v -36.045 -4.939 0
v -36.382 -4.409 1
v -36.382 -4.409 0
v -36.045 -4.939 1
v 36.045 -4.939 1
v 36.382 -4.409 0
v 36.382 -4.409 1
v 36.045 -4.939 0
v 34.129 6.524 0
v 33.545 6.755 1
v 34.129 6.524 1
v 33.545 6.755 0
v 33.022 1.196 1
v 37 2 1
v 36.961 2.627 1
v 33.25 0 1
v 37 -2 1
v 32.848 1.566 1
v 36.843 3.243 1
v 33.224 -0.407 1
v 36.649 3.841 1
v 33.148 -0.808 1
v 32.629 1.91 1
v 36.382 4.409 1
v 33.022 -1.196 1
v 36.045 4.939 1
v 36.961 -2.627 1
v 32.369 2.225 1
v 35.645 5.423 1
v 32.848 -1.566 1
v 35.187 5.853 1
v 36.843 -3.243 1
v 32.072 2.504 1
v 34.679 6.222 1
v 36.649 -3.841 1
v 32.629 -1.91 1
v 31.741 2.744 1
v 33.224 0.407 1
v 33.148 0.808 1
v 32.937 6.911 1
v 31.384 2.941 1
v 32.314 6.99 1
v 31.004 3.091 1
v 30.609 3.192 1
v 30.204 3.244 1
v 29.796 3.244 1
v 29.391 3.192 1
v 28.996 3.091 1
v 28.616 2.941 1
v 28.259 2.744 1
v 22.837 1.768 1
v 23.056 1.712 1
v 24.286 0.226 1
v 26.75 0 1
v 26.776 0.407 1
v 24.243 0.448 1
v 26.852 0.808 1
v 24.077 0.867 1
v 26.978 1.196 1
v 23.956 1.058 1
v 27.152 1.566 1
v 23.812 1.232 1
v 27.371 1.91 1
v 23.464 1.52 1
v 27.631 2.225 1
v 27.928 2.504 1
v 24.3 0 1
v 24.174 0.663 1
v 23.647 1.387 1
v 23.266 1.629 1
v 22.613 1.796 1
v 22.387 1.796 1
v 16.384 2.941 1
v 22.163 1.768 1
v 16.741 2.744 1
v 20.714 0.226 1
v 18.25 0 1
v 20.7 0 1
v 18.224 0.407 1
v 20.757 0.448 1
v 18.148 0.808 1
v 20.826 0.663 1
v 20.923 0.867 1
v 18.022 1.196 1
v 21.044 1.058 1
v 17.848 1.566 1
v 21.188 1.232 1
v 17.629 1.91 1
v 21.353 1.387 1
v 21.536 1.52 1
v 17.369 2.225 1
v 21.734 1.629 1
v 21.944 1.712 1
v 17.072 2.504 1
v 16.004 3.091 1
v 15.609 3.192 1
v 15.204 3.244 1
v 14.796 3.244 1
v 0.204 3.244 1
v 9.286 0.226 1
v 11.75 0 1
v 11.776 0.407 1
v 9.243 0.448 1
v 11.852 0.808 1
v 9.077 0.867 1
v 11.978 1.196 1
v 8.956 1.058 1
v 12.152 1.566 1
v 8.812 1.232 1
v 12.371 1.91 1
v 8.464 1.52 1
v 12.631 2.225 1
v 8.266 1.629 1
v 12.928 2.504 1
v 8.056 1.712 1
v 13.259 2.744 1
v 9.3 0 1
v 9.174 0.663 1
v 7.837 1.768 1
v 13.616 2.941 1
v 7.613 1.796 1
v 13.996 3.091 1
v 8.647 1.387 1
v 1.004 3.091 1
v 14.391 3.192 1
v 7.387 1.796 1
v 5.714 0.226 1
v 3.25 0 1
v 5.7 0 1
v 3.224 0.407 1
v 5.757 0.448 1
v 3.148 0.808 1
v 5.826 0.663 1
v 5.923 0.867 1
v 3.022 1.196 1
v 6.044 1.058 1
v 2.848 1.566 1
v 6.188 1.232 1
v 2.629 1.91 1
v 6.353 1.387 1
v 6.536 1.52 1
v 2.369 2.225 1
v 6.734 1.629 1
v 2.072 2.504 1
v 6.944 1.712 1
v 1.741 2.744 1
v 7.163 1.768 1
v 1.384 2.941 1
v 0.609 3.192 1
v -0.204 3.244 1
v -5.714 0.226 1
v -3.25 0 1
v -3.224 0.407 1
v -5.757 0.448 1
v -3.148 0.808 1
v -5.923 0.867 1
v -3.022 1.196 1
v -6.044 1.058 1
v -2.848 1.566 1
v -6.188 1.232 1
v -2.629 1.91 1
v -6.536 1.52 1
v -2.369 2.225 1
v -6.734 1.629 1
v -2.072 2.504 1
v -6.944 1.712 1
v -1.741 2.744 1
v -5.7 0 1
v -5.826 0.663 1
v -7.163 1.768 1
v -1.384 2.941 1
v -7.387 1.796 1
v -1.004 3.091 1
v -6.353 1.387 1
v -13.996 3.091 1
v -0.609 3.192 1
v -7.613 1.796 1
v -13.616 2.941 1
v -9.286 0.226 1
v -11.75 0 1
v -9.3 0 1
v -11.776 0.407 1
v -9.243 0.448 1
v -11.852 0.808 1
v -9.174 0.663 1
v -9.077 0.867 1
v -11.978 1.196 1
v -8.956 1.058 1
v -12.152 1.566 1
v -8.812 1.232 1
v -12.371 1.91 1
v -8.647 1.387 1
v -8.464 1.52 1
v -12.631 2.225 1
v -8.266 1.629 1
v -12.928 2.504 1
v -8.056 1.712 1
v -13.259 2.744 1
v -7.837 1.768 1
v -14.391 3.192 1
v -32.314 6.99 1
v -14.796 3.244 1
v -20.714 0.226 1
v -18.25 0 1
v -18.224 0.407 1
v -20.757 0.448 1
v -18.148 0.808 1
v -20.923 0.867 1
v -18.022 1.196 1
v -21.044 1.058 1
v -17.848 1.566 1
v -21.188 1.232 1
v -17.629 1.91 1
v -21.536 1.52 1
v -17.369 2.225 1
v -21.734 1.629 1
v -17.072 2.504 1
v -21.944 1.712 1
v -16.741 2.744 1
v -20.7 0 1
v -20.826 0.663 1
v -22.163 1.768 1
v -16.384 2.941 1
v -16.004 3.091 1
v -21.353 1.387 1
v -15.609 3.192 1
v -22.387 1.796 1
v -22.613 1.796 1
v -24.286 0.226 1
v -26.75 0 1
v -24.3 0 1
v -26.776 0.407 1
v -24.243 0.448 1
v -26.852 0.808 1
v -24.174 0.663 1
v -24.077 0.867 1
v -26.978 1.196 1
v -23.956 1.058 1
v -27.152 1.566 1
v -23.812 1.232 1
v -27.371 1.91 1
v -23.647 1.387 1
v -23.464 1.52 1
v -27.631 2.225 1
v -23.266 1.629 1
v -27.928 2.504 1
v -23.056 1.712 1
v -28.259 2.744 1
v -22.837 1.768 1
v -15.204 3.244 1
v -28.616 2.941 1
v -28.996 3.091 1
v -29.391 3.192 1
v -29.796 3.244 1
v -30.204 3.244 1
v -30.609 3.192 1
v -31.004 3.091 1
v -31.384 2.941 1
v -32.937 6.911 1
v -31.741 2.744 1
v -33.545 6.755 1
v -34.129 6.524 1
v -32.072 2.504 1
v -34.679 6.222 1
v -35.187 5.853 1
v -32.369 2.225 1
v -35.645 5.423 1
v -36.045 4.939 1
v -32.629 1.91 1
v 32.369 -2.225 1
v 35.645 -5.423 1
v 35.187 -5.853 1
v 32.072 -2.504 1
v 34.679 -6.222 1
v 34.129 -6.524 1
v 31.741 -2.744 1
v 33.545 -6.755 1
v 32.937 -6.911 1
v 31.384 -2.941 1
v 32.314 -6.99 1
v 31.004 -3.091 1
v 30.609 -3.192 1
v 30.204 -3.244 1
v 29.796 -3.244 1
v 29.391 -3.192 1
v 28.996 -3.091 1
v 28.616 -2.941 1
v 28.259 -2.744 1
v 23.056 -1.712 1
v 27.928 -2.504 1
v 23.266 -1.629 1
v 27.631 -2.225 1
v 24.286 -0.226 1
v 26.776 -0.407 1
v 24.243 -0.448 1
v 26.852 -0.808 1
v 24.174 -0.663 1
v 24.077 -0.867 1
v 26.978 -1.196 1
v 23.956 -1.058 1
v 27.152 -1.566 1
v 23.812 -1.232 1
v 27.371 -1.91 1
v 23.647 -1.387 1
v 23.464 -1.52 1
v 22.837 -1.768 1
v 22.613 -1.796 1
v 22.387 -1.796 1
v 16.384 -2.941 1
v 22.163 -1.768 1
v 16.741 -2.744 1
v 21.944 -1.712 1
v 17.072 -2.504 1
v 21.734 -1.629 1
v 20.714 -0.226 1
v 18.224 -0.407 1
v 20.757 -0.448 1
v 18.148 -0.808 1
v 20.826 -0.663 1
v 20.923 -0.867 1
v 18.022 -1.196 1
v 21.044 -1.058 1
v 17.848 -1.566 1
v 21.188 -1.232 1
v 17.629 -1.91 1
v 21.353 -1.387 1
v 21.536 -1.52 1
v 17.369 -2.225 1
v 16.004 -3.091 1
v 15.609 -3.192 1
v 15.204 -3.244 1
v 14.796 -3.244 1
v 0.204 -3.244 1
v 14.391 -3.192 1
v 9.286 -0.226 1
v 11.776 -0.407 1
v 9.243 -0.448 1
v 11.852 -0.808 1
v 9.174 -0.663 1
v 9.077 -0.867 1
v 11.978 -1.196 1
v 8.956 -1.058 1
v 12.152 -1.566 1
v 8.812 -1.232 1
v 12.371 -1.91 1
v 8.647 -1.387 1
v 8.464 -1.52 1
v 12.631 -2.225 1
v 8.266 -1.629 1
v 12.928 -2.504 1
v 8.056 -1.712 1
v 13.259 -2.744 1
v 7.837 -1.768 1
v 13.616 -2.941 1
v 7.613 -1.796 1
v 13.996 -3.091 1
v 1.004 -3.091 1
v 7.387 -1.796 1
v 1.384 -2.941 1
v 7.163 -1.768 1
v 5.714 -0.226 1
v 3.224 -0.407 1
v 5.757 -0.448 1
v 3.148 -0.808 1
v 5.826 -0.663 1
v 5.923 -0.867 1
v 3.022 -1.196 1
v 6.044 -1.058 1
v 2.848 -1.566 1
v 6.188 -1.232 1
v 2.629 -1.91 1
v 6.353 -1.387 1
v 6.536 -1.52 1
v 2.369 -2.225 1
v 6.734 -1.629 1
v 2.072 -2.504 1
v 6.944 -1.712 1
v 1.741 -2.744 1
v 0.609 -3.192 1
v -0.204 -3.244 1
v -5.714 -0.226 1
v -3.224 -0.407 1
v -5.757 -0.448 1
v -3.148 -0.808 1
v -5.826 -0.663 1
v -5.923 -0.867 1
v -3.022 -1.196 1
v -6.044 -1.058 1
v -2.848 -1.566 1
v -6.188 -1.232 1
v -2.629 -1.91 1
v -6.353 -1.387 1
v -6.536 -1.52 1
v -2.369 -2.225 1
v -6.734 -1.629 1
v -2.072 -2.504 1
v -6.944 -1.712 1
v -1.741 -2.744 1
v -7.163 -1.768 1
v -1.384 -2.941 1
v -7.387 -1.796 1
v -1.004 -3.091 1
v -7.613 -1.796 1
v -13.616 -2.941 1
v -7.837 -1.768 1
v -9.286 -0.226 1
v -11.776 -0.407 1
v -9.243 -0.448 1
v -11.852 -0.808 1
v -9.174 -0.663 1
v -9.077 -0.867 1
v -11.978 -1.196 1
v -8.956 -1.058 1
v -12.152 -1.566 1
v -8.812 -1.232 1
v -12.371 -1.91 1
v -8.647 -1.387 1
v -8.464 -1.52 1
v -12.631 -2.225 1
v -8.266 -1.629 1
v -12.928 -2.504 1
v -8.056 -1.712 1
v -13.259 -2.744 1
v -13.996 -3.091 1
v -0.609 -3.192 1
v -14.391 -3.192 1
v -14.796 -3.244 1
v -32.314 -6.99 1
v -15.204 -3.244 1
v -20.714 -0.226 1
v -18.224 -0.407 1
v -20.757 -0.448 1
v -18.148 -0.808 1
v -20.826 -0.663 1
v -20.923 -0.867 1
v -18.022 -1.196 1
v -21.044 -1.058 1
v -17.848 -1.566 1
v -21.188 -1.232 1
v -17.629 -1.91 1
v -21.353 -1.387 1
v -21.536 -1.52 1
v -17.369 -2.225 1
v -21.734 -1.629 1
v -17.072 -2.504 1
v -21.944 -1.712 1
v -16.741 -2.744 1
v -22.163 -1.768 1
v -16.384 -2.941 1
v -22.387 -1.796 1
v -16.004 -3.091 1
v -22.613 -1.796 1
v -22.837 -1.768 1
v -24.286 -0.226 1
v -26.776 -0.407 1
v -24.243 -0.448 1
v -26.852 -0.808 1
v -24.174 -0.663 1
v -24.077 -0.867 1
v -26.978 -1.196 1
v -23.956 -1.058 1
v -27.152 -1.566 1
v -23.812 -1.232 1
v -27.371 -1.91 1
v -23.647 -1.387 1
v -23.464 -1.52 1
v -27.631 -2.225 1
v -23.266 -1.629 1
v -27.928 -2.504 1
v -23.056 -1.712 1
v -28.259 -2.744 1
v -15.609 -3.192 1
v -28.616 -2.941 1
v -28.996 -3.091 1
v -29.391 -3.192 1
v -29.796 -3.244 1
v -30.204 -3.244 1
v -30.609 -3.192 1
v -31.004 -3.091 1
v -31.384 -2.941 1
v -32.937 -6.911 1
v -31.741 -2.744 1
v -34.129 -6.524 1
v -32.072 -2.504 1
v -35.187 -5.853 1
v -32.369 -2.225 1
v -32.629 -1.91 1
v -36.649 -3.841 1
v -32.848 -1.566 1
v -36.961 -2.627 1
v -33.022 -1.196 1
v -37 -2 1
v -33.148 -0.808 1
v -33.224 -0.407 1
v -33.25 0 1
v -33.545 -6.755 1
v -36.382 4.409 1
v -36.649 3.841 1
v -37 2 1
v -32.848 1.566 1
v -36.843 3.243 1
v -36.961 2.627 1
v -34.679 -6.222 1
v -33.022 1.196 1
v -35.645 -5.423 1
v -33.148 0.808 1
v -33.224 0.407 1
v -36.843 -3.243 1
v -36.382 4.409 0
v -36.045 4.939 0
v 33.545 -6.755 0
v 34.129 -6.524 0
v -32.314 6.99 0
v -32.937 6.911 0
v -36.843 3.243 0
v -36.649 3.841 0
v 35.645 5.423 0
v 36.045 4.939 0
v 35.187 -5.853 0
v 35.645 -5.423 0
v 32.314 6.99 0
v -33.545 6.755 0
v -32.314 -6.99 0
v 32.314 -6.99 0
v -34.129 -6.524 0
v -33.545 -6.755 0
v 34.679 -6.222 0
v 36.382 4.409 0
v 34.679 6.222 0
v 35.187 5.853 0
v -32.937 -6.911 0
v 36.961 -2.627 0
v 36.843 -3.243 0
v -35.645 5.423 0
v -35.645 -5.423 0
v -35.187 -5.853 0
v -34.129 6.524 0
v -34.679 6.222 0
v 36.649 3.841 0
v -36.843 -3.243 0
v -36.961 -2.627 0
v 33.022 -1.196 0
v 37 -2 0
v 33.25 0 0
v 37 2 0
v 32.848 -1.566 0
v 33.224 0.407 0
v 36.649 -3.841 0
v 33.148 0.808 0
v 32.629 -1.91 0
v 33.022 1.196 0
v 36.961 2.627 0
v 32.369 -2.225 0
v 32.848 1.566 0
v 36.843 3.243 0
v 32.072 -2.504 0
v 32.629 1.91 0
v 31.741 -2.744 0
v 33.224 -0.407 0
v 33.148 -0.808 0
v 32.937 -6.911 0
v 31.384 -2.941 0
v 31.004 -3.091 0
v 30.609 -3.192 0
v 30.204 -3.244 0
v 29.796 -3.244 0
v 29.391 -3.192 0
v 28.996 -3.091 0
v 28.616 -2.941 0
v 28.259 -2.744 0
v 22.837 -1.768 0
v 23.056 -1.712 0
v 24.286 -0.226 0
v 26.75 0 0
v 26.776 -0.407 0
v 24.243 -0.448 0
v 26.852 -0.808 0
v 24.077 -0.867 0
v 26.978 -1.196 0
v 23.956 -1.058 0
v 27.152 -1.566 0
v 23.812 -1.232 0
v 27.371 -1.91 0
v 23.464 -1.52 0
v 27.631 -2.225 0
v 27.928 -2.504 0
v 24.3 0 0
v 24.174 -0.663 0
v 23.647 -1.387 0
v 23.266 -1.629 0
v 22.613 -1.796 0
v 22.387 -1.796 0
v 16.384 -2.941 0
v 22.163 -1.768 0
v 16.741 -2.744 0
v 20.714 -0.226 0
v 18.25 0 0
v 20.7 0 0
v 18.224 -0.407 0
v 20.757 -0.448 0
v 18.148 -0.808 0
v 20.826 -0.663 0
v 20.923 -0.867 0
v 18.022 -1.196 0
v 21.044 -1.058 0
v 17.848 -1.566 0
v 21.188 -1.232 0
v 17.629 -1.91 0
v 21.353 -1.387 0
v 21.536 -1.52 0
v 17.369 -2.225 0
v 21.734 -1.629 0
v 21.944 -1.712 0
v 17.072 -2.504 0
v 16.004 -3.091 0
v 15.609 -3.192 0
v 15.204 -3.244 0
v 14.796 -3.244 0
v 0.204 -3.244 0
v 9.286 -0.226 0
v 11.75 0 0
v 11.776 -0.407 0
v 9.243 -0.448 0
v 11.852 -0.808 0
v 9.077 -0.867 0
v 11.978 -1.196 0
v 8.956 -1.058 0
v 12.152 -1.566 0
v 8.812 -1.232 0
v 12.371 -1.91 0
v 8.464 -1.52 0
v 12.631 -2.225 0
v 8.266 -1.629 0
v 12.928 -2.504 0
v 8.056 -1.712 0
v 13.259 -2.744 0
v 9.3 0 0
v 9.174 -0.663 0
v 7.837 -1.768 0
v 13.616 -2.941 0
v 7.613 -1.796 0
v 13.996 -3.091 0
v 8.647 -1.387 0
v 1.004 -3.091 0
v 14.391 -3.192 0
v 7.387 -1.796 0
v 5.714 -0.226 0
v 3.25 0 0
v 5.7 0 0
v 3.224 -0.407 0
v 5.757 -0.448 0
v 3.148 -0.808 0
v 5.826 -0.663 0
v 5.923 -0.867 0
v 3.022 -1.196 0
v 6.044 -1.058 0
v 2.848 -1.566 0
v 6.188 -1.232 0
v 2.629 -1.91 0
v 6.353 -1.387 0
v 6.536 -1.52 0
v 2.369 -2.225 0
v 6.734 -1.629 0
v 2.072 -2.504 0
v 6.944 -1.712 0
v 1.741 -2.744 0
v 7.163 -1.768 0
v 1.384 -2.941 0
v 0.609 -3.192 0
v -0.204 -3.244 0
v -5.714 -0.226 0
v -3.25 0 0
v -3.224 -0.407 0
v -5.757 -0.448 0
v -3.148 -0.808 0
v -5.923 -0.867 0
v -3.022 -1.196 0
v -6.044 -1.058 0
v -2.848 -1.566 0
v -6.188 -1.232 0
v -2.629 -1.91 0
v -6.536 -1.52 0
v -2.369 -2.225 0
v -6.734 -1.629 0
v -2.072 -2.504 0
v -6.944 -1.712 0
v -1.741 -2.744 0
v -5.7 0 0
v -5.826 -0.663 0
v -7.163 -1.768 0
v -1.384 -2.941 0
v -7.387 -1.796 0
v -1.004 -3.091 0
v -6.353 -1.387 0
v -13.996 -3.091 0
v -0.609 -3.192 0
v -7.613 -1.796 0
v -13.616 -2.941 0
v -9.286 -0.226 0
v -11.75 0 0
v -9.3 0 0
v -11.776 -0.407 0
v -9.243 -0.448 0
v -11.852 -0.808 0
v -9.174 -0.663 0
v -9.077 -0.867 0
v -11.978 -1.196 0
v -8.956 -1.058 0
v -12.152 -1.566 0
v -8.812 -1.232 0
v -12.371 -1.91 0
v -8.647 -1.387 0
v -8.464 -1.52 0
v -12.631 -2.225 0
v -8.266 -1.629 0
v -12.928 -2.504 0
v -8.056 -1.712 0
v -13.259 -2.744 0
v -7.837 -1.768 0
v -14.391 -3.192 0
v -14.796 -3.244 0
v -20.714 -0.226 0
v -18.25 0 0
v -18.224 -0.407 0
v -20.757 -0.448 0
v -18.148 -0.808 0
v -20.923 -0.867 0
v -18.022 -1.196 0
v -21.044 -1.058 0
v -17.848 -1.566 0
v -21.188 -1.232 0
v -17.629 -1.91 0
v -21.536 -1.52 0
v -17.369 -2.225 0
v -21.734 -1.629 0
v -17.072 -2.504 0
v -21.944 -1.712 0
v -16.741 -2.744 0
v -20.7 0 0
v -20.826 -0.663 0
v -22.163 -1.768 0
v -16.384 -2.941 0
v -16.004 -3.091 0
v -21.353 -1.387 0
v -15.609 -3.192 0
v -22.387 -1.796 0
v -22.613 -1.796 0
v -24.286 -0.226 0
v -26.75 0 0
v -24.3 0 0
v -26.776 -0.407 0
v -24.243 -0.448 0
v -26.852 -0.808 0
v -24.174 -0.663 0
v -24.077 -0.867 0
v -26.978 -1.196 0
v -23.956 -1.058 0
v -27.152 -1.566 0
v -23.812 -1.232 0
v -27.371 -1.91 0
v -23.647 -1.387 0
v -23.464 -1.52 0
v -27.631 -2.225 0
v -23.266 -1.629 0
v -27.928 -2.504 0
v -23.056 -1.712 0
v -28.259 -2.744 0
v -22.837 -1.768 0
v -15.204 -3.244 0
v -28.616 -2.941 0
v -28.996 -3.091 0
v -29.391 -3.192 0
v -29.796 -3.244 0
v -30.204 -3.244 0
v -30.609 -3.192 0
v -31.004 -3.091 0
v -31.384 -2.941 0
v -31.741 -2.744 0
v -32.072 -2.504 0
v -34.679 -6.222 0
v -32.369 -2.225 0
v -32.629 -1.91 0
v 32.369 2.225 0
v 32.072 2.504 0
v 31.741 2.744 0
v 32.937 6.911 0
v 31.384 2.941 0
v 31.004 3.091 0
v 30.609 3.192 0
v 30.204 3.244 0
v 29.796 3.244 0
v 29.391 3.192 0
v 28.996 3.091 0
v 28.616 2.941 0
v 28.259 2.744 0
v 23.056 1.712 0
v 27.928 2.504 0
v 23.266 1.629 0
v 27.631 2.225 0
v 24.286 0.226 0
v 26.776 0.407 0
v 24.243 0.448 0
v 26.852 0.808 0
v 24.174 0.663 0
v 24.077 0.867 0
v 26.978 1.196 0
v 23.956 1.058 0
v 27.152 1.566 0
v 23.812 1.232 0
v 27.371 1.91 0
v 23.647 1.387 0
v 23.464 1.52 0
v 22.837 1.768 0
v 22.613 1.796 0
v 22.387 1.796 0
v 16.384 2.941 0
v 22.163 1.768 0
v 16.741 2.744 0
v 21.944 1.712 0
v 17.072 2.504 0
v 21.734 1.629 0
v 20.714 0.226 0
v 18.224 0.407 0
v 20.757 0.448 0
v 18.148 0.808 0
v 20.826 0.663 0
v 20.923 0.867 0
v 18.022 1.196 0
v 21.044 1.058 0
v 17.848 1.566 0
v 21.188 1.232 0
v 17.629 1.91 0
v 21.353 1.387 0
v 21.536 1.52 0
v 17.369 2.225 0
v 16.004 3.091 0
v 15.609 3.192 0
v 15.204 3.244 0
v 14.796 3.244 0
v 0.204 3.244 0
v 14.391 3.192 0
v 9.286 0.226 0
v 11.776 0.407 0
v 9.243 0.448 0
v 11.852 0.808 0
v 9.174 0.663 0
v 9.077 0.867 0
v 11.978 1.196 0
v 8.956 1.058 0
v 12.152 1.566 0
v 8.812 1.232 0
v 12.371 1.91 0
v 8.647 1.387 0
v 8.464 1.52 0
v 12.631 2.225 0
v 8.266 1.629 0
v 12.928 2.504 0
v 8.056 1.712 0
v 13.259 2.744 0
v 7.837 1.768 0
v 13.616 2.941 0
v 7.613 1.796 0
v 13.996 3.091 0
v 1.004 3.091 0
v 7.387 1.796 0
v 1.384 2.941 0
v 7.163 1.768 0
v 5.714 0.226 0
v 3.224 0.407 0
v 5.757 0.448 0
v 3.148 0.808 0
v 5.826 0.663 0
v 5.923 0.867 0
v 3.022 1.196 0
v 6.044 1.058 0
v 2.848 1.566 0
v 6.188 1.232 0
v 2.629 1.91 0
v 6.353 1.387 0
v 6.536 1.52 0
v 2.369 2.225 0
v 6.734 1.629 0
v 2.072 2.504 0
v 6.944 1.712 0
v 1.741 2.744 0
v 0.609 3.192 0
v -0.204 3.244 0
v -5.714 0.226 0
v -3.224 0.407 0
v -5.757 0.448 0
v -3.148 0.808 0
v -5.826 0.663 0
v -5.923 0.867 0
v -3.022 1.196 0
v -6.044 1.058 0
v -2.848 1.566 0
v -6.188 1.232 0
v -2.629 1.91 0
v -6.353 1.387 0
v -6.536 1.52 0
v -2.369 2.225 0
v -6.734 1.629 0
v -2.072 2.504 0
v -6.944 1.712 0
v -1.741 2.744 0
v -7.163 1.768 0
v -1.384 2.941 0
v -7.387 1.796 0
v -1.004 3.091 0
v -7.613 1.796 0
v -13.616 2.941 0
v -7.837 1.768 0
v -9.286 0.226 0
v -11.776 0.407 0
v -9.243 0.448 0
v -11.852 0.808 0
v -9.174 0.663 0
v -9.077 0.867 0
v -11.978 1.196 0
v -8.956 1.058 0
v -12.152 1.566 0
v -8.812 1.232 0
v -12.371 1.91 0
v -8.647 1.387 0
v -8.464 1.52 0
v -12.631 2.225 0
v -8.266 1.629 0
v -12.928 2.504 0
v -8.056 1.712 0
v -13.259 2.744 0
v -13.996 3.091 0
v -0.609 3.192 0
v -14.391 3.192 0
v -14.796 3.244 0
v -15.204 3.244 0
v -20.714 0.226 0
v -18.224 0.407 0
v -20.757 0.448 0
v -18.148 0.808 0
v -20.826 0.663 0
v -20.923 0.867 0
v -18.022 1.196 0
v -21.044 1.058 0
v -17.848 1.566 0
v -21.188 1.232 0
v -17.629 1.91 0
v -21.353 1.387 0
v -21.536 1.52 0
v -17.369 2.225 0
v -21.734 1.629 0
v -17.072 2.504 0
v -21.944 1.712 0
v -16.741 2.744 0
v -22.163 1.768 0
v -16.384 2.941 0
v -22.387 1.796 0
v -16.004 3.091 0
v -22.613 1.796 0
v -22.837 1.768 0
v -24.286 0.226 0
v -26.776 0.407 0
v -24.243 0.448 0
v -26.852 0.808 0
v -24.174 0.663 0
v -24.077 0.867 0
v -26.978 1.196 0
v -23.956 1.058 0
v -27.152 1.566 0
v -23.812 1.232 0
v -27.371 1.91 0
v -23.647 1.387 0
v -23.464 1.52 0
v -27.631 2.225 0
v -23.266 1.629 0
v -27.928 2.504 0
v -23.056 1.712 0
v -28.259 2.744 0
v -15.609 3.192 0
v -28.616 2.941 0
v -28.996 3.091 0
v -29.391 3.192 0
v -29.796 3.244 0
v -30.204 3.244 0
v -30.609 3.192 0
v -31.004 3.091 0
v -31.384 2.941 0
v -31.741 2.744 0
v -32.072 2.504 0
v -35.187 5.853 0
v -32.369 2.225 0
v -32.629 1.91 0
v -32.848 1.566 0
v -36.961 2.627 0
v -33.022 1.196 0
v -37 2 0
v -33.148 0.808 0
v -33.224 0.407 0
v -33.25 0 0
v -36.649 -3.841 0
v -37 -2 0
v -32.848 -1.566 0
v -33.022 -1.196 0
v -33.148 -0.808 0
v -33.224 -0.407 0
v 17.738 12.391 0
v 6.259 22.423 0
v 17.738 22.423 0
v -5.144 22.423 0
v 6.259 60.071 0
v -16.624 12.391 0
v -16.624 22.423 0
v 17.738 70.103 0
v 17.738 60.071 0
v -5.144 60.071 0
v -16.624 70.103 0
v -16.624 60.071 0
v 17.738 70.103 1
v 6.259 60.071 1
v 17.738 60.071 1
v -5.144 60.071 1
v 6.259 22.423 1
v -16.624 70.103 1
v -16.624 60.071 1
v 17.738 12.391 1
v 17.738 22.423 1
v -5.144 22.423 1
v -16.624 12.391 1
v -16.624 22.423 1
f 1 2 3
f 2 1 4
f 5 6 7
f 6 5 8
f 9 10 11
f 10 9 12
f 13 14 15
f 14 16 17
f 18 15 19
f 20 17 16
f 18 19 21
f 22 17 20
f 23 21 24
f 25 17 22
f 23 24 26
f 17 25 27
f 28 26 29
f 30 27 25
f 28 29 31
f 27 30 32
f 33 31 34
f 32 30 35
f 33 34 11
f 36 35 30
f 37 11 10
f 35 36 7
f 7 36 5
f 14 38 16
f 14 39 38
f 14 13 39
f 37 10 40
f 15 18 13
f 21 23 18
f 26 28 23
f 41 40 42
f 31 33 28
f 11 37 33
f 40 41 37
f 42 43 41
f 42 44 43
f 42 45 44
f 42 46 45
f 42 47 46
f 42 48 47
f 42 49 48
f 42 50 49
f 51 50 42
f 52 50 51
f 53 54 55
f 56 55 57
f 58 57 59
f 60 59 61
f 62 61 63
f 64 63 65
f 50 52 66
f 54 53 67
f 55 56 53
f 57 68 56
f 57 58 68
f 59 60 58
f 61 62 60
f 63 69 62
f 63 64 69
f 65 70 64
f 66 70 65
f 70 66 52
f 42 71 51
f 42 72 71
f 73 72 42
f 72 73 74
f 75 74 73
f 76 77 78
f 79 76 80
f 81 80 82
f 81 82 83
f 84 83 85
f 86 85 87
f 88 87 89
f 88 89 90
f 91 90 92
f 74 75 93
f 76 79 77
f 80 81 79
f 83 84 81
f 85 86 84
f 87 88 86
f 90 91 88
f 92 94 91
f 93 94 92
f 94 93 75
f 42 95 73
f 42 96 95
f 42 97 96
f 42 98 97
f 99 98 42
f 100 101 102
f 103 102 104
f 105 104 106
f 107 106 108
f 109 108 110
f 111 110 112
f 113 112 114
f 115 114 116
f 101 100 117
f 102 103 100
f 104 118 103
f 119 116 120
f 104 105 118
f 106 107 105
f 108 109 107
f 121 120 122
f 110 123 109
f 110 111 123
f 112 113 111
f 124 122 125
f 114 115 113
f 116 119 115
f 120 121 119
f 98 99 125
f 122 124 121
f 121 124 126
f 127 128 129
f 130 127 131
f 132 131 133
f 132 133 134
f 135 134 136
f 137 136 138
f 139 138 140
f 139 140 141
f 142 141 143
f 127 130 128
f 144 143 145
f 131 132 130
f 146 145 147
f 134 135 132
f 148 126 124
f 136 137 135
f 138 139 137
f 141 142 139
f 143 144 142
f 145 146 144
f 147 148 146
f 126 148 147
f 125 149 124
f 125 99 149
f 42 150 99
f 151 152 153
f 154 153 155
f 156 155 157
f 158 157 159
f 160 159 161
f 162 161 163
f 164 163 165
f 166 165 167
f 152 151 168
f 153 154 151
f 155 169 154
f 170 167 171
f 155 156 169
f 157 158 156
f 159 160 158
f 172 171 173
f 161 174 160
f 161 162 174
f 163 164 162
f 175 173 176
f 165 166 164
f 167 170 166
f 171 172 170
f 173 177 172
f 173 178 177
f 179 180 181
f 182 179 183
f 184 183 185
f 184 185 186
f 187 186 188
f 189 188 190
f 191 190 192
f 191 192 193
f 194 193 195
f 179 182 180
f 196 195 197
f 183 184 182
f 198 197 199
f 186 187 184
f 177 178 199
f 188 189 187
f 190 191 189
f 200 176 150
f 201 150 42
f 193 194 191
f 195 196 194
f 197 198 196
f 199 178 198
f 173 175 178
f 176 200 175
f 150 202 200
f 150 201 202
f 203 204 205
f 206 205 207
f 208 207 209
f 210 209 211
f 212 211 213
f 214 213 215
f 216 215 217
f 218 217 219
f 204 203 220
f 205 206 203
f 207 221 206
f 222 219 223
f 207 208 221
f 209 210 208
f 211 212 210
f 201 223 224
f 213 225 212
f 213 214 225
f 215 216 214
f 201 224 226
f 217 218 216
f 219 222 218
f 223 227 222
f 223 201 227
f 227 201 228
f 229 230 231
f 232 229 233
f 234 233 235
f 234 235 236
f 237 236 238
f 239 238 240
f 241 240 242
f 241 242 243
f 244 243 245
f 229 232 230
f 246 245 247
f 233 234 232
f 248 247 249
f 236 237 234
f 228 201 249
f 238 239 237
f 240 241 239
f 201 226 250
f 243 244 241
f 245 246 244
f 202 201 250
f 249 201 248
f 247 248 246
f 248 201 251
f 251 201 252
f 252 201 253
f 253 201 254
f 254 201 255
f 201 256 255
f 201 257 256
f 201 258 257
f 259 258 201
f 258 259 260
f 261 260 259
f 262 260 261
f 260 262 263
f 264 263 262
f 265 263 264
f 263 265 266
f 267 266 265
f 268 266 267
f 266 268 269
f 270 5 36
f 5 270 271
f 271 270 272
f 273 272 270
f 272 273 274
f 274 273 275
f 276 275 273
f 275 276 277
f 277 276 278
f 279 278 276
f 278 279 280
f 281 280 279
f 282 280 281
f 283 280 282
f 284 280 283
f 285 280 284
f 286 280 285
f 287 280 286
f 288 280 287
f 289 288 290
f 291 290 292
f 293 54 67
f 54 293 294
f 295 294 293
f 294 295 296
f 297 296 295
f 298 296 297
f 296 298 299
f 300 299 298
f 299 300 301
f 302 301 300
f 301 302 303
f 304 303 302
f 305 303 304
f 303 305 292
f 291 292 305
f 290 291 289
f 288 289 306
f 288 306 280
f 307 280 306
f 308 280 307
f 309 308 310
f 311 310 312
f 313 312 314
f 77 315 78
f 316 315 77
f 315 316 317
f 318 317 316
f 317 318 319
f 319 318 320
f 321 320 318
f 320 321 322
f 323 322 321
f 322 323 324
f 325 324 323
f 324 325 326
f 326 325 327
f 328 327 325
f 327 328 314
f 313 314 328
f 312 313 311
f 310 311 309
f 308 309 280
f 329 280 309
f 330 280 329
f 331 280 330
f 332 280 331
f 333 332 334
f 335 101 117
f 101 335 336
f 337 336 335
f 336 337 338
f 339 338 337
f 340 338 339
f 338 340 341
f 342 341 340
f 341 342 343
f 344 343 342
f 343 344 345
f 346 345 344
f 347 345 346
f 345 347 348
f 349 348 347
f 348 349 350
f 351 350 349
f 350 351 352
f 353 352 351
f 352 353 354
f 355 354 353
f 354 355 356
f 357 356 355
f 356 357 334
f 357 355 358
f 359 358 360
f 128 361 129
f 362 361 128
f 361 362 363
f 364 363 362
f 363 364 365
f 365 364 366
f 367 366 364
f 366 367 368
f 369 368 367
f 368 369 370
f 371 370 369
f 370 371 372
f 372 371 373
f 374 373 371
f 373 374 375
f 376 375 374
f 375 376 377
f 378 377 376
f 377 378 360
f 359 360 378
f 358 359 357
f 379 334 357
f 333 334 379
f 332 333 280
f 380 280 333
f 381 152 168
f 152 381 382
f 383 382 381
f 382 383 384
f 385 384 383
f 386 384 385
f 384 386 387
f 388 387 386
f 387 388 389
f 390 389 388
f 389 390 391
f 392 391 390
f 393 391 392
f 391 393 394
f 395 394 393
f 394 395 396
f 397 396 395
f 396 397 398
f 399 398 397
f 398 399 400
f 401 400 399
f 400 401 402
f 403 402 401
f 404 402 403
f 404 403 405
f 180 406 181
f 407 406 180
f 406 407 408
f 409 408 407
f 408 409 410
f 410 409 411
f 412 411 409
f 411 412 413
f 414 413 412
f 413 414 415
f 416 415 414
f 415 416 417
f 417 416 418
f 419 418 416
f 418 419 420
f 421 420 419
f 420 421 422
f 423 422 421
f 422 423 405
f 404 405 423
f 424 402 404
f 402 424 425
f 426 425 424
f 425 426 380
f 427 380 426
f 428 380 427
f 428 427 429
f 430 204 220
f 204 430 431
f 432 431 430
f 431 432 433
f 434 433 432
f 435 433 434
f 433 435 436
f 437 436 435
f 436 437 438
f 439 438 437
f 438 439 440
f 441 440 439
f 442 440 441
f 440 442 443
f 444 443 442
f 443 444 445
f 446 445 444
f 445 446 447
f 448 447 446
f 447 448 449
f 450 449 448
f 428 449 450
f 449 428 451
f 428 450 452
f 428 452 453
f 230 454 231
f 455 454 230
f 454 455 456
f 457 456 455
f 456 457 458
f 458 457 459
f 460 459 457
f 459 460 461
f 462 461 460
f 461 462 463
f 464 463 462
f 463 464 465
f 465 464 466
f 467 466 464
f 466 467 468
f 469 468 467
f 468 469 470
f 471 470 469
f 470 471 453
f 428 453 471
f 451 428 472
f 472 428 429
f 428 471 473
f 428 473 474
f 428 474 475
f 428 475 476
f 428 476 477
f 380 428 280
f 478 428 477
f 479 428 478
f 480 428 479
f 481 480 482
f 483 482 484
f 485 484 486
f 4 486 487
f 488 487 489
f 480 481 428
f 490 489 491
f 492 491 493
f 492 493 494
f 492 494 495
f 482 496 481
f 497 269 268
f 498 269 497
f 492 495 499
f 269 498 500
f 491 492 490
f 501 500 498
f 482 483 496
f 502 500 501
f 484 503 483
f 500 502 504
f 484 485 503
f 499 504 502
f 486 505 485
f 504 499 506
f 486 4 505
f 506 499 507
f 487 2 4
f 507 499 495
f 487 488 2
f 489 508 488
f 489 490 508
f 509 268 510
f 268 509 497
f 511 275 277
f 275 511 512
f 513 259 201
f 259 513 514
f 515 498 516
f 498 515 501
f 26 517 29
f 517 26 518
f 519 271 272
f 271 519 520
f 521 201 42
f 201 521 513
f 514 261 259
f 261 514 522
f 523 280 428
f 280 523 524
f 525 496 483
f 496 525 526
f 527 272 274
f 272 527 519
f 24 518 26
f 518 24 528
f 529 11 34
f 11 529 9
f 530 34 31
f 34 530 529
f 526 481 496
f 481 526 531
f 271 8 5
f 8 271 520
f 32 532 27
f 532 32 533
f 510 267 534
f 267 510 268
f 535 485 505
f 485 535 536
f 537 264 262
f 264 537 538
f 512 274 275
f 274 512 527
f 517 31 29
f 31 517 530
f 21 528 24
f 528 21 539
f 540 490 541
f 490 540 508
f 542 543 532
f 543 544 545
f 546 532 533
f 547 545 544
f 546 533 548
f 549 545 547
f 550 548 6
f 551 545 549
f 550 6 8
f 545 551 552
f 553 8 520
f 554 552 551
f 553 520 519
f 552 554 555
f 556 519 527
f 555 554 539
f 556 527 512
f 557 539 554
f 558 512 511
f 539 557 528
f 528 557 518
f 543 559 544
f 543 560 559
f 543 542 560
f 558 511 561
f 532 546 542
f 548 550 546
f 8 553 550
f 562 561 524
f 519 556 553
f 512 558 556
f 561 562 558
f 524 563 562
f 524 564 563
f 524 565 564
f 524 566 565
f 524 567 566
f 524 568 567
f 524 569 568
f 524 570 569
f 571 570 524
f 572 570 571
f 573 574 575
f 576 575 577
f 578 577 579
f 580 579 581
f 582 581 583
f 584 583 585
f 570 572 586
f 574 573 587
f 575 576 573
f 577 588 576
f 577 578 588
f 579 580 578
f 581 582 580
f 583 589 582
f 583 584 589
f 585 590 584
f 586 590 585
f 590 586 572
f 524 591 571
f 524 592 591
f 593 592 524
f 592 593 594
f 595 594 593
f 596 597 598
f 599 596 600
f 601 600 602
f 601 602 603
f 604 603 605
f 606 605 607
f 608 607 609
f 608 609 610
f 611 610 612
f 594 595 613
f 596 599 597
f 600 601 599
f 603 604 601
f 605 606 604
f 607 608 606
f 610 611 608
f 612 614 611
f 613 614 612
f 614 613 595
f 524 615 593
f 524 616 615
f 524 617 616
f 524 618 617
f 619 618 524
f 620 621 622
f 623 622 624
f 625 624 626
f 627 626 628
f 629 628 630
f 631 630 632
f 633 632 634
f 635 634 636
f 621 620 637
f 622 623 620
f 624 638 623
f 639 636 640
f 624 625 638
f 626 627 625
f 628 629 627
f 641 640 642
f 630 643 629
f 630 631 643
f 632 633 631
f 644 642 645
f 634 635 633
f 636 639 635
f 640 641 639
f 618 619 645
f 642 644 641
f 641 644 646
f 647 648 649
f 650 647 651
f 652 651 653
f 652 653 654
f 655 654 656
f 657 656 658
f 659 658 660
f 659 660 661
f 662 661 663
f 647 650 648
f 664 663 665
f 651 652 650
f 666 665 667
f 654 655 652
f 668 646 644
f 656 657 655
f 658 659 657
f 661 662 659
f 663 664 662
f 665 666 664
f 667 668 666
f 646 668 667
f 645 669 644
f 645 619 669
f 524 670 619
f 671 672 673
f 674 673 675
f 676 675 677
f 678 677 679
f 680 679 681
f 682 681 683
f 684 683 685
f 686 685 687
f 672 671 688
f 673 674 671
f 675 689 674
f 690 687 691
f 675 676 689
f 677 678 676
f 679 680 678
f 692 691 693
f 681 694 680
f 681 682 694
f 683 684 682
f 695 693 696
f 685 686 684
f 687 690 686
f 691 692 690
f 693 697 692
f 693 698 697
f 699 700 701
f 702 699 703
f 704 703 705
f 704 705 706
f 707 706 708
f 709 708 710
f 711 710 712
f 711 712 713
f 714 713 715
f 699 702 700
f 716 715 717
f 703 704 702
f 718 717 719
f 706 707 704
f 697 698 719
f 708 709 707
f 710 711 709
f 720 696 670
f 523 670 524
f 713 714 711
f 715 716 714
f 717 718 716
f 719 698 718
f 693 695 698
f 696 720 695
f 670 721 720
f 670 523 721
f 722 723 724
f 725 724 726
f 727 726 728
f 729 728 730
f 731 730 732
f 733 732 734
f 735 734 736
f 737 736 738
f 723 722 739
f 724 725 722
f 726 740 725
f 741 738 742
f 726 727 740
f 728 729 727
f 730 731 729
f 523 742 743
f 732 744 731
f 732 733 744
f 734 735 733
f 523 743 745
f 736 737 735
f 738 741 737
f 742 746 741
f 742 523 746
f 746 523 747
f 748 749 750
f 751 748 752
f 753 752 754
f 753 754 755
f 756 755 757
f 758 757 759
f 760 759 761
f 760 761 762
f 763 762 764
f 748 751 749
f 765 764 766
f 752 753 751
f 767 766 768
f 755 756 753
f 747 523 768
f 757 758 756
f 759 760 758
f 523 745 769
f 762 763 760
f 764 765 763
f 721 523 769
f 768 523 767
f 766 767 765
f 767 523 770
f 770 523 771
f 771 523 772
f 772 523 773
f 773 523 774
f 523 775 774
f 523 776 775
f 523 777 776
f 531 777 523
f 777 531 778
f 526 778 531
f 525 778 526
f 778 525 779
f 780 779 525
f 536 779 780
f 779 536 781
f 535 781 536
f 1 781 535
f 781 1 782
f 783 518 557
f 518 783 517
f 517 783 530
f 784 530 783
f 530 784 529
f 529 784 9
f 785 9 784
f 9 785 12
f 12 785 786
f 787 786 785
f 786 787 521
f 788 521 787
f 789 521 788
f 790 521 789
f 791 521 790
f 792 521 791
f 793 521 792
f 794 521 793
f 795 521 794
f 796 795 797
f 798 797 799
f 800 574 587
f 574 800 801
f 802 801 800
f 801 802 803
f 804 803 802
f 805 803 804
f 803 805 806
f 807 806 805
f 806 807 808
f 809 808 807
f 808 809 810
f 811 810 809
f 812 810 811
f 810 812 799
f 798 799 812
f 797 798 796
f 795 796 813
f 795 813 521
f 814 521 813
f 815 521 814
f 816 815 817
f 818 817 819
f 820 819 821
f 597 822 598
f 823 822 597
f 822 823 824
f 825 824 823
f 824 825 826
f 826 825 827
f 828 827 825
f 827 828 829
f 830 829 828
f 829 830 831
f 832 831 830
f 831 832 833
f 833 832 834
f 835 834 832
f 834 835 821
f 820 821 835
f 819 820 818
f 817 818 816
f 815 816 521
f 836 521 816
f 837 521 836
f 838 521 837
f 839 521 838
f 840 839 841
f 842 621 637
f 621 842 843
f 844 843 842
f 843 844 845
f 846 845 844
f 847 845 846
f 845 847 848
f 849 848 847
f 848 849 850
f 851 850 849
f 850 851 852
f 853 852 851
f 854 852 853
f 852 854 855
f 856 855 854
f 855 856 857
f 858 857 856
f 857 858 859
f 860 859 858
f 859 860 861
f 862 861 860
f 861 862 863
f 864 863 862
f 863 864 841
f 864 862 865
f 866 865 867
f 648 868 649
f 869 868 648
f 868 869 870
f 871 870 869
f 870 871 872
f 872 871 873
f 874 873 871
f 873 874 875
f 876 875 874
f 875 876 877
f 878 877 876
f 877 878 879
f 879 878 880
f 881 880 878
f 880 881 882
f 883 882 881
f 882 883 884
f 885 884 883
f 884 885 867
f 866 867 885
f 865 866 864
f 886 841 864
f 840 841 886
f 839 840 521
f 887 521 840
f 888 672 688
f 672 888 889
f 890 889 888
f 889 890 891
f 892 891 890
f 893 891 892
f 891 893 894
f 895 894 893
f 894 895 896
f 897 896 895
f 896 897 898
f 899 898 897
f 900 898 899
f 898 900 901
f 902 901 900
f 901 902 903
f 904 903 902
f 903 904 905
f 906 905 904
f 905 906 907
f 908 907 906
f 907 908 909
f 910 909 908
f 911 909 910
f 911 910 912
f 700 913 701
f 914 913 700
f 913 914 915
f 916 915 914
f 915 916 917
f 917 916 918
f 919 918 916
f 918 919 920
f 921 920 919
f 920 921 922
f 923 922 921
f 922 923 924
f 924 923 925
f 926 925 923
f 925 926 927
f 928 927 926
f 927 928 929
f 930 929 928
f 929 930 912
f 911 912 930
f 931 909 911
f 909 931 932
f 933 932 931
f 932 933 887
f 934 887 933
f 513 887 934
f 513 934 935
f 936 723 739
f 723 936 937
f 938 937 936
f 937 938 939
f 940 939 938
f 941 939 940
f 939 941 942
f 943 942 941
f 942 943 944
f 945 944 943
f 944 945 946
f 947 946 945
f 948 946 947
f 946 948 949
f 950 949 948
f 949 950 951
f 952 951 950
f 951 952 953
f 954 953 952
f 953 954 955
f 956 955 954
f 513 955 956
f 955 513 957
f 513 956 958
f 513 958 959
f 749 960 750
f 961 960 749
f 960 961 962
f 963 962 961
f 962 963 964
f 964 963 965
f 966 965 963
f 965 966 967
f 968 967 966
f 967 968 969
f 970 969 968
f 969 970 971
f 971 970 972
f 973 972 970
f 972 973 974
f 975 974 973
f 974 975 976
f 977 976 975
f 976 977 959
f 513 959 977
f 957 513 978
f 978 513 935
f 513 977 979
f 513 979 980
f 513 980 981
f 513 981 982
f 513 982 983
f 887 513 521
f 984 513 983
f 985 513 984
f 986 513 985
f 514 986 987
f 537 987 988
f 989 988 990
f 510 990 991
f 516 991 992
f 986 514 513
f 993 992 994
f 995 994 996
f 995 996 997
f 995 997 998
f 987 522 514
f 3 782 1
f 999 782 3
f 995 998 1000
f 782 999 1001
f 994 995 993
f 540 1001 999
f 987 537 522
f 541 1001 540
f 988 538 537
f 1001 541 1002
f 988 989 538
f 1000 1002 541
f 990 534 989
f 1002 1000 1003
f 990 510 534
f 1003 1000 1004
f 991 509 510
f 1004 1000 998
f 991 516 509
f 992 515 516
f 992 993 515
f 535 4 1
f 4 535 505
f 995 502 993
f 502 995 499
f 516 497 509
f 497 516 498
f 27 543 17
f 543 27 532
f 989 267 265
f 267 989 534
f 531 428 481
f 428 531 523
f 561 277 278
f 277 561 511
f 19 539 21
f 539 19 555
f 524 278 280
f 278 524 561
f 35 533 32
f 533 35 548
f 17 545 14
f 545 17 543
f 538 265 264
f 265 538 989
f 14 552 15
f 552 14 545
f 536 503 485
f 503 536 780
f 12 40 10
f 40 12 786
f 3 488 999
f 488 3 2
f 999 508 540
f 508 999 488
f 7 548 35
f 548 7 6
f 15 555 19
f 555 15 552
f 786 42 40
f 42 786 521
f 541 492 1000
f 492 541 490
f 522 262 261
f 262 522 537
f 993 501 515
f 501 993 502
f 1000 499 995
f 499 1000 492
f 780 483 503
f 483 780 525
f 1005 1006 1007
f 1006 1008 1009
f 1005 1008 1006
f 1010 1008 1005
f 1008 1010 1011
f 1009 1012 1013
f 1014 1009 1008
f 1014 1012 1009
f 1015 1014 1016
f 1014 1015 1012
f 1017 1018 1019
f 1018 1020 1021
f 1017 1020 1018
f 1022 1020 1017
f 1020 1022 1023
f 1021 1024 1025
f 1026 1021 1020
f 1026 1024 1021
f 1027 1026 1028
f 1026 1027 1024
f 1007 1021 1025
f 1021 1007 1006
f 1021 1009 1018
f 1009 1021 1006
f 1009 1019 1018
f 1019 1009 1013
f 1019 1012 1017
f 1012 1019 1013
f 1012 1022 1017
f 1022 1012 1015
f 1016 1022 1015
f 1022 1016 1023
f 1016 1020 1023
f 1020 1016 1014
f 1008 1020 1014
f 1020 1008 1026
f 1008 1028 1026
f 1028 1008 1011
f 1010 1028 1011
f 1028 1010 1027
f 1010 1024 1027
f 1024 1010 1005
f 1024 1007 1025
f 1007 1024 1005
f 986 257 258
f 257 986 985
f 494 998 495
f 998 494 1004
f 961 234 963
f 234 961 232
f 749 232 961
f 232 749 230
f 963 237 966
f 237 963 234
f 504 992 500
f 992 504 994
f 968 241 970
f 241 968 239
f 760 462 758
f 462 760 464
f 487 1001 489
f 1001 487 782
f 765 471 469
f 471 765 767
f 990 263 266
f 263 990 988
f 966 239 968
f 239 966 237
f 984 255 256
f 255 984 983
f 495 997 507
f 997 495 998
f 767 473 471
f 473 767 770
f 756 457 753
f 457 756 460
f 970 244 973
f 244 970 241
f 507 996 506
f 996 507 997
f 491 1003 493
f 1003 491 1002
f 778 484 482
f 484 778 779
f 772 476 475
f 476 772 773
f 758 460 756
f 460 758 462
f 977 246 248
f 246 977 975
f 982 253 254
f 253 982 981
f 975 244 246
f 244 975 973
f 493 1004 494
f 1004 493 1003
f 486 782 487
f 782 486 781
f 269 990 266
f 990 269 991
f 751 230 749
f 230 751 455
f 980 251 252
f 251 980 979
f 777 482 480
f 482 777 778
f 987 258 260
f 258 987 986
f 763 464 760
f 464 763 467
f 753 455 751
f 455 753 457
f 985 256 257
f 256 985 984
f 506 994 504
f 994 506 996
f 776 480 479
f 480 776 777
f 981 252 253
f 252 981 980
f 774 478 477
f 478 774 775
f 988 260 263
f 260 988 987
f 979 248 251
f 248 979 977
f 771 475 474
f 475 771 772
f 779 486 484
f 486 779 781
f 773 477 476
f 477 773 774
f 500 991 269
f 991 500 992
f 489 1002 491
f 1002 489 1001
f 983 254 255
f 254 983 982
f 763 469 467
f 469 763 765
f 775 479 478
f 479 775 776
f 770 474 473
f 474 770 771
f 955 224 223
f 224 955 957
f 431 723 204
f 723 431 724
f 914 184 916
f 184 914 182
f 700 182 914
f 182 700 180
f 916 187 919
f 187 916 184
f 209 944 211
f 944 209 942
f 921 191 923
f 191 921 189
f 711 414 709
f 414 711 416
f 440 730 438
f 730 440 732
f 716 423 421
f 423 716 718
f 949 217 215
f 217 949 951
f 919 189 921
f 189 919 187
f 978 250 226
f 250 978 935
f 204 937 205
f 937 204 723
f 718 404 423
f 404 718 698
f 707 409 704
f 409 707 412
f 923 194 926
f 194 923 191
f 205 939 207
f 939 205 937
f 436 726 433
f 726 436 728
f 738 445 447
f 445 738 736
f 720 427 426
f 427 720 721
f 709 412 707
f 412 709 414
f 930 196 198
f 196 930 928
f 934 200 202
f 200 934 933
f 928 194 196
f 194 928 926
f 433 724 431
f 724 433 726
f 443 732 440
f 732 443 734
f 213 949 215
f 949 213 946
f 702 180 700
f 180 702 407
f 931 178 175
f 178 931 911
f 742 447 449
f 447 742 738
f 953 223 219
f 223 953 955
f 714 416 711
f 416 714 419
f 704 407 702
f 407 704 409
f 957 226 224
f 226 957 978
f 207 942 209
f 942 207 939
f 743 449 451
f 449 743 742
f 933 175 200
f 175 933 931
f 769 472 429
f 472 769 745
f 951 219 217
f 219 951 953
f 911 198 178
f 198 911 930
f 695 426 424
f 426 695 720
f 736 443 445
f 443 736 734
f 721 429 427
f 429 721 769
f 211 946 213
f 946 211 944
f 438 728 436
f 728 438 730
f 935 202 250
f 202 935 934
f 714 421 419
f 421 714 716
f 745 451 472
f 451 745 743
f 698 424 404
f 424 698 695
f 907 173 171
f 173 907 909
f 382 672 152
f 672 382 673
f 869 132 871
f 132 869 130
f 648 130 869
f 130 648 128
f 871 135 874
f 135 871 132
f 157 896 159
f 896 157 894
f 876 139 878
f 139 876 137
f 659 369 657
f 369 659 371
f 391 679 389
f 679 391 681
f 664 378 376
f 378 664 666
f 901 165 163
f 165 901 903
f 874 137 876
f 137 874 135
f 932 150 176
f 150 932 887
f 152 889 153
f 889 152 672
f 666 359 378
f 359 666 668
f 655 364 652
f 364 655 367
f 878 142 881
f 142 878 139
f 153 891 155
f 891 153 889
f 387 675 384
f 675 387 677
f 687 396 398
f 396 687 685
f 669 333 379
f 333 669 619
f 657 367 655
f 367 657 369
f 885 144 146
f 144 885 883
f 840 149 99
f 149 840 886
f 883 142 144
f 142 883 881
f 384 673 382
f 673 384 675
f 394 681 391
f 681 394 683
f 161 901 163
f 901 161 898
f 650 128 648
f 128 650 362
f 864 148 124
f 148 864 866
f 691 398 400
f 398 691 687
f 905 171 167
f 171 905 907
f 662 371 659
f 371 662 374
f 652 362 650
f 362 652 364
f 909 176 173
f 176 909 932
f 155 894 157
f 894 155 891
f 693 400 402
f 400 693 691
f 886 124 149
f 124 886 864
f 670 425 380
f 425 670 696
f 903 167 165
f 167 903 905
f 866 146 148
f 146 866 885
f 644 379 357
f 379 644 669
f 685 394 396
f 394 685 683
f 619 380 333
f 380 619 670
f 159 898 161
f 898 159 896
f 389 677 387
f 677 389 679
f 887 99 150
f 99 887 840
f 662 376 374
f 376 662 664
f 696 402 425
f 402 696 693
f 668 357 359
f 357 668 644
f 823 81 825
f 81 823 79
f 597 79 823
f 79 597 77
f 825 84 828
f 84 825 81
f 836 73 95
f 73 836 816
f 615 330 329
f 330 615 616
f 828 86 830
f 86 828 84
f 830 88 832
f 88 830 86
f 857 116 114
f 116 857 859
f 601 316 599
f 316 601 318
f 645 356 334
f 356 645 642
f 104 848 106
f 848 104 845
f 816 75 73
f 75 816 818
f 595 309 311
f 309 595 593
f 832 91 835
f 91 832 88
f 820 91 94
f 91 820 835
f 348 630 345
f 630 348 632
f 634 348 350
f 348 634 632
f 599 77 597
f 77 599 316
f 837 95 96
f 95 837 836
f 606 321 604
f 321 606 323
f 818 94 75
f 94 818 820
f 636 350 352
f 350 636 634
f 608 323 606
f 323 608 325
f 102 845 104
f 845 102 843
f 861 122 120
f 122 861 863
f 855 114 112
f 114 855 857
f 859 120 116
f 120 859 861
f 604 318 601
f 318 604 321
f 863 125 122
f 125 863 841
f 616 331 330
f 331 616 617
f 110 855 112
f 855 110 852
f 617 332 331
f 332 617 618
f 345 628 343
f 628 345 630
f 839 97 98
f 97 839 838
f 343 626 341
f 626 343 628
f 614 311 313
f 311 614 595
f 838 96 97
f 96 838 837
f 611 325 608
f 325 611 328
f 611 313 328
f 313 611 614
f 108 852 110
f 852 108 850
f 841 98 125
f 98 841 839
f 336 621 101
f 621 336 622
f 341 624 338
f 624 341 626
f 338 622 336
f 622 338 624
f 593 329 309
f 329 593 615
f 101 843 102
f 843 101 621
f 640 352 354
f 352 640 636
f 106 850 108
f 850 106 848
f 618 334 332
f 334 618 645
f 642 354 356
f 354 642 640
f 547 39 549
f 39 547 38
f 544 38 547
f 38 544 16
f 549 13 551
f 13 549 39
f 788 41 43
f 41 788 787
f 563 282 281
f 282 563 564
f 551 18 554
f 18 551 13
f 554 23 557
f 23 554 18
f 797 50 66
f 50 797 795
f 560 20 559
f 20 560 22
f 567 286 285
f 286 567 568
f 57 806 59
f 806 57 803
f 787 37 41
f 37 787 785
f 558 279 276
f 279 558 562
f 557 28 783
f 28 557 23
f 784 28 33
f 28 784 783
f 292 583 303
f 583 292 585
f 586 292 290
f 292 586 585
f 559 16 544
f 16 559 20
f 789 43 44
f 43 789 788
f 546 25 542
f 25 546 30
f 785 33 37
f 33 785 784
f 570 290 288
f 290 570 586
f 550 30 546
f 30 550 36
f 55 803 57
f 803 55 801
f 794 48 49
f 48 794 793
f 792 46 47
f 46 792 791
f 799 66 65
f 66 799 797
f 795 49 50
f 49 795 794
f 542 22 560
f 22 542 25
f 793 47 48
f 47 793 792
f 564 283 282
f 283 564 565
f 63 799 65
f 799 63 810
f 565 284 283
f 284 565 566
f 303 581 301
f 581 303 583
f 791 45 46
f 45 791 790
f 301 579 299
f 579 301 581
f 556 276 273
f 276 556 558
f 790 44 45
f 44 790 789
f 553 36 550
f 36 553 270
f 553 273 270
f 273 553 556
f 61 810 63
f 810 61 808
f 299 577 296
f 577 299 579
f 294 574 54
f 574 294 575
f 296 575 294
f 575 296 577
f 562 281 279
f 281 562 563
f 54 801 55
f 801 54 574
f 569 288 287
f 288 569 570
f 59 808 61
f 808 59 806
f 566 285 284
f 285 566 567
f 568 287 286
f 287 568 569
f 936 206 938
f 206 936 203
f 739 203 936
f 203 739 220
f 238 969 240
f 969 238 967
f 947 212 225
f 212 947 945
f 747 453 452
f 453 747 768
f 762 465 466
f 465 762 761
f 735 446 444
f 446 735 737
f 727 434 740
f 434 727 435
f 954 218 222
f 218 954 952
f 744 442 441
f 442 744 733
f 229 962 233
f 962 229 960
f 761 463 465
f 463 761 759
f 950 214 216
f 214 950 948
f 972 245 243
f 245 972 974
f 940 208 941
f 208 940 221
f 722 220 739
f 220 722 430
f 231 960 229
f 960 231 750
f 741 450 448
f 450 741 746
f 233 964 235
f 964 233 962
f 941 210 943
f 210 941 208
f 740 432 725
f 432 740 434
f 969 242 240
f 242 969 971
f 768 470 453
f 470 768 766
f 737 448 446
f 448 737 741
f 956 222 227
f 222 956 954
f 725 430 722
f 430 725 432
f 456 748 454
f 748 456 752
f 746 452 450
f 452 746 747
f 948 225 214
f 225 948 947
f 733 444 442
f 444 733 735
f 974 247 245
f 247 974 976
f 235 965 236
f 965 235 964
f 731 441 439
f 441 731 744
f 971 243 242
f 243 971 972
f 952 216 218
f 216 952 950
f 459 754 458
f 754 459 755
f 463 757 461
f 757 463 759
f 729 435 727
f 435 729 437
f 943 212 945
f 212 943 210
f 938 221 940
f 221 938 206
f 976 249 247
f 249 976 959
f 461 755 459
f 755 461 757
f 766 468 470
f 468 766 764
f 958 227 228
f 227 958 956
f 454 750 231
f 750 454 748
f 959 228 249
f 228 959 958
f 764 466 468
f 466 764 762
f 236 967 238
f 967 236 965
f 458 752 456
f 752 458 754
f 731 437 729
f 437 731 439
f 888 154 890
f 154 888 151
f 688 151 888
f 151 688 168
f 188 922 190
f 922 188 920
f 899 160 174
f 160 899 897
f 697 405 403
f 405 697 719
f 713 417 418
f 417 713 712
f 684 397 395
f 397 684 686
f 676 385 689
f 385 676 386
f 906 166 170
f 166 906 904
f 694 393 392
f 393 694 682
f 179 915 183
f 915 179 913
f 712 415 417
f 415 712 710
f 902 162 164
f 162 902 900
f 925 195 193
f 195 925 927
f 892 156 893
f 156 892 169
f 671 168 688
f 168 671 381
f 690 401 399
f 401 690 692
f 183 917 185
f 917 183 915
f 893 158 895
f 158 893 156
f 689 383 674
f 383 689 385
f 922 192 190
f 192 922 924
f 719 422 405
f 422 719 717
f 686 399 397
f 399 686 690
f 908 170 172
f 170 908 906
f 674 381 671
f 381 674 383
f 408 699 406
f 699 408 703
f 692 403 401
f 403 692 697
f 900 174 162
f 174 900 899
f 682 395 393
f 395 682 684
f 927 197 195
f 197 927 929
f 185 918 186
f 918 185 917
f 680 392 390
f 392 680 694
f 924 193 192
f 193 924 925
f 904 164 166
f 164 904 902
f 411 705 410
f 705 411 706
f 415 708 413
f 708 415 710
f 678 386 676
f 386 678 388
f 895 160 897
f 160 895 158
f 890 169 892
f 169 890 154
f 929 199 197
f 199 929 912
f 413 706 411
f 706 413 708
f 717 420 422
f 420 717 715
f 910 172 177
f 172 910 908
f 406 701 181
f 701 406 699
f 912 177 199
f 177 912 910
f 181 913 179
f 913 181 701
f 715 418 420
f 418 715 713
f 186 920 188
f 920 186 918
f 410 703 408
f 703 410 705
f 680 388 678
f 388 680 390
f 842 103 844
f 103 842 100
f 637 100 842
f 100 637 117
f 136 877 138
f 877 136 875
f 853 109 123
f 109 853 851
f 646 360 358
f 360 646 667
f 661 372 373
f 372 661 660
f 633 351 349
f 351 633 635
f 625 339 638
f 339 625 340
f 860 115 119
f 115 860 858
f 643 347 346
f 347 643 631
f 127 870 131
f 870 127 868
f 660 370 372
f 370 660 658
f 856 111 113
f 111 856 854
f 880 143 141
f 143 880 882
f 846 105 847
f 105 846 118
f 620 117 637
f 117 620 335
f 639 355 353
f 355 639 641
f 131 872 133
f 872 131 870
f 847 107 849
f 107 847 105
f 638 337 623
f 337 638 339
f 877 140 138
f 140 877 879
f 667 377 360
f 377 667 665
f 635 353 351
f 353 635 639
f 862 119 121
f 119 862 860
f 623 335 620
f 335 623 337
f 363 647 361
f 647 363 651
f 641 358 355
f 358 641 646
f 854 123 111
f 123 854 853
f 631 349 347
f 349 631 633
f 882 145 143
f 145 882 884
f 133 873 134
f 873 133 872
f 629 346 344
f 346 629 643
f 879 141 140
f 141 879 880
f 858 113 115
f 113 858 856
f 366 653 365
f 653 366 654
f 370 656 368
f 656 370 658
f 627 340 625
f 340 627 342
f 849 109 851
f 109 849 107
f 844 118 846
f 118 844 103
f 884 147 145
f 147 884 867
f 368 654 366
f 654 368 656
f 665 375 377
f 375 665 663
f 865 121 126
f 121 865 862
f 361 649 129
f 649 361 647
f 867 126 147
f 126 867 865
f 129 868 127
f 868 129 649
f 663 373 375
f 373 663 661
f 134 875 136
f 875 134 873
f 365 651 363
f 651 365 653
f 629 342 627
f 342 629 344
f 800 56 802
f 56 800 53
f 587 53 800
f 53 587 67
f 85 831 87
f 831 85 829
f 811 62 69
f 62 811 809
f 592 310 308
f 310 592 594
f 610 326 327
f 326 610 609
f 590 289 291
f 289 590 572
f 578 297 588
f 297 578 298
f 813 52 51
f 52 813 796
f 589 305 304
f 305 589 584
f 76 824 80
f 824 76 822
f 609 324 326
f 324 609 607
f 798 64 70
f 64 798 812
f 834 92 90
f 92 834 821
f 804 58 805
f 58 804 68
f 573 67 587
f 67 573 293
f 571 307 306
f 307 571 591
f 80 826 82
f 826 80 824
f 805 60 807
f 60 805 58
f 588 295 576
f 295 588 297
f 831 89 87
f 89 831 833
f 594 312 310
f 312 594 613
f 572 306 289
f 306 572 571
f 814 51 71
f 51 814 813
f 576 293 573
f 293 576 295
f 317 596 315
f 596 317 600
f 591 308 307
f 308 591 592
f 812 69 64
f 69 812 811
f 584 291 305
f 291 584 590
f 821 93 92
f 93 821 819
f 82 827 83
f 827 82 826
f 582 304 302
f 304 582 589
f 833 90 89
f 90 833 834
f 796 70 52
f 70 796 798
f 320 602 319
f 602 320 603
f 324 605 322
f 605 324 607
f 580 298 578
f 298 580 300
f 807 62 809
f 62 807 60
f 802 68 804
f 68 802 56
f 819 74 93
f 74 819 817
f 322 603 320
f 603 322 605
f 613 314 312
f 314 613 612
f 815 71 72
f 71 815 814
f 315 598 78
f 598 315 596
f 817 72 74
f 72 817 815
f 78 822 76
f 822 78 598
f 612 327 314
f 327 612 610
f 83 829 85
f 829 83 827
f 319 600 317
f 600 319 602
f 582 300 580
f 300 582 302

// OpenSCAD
$fn = 50;


difference() {
	union() {
		hull() {
			translate(v = [-32.0000000000, 2.0000000000, 0]) {
				cylinder(h = 1, r = 5);
			}
			translate(v = [32.0000000000, 2.0000000000, 0]) {
				cylinder(h = 1, r = 5);
			}
			translate(v = [-32.0000000000, -2.0000000000, 0]) {
				cylinder(h = 1, r = 5);
			}
			translate(v = [32.0000000000, -2.0000000000, 0]) {
				cylinder(h = 1, r = 5);
			}
		}
		translate(v = [0, 68.7500000000, 0]) {
			linear_extrude(height = 1) {
				text(font = "DejaVu Sans Mono:style=Bold", halign = "center", size = 57.0000000000, text = "I", valign = "top");
			}
		}
	}
	union() {
		translate(v = [-30.0000000000, 0.0000000000, 0]) {
			translate(v = [0, 0, -100]) {
				cylinder(h = 200, r = 3.2500000000);
			}
		}
		translate(v = [-15.0000000000, 0.0000000000, 0]) {
			translate(v = [0, 0, -100]) {
				cylinder(h = 200, r = 3.2500000000);
			}
		}
		translate(v = [0, 0, -100]) {
			cylinder(h = 200, r = 3.2500000000);
		}
		translate(v = [15.0000000000, 0.0000000000, 0]) {
			translate(v = [0, 0, -100]) {
				cylinder(h = 200, r = 3.2500000000);
			}
		}
		translate(v = [30.0000000000, 0.0000000000, 0]) {
			translate(v = [0, 0, -100]) {
				cylinder(h = 200, r = 3.2500000000);
			}
		}
		translate(v = [-30.0000000000, 0.0000000000, 0]) {
			translate(v = [0, 0, -100]) {
				cylinder(h = 200, r = 1.8000000000);
			}
		}
		translate(v = [-22.5000000000, 0.0000000000, 0]) {
			translate(v = [0, 0, -100]) {
				cylinder(h = 200, r = 1.8000000000);
			}
		}
		translate(v = [-15.0000000000, 0.0000000000, 0]) {
			translate(v = [0, 0, -100]) {
				cylinder(h = 200, r = 1.8000000000);
			}
		}
		translate(v = [-7.5000000000, 0.0000000000, 0]) {
			translate(v = [0, 0, -100]) {
				cylinder(h = 200, r = 1.8000000000);
			}
		}
		translate(v = [0, 0, -100]) {
			cylinder(h = 200, r = 1.8000000000);
		}
		translate(v = [7.5000000000, 0.0000000000, 0]) {
			translate(v = [0, 0, -100]) {
				cylinder(h = 200, r = 1.8000000000);
			}
		}
		translate(v = [15.0000000000, 0.0000000000, 0]) {
			translate(v = [0, 0, -100]) {
				cylinder(h = 200, r = 1.8000000000);
			}
		}
		translate(v = [22.5000000000, 0.0000000000, 0]) {
			translate(v = [0, 0, -100]) {
				cylinder(h = 200, r = 1.8000000000);
			}
		}
		translate(v = [30.0000000000, 0.0000000000, 0]) {
			translate(v = [0, 0, -100]) {
				cylinder(h = 200, r = 1.8000000000);
			}
		}
	}
}
